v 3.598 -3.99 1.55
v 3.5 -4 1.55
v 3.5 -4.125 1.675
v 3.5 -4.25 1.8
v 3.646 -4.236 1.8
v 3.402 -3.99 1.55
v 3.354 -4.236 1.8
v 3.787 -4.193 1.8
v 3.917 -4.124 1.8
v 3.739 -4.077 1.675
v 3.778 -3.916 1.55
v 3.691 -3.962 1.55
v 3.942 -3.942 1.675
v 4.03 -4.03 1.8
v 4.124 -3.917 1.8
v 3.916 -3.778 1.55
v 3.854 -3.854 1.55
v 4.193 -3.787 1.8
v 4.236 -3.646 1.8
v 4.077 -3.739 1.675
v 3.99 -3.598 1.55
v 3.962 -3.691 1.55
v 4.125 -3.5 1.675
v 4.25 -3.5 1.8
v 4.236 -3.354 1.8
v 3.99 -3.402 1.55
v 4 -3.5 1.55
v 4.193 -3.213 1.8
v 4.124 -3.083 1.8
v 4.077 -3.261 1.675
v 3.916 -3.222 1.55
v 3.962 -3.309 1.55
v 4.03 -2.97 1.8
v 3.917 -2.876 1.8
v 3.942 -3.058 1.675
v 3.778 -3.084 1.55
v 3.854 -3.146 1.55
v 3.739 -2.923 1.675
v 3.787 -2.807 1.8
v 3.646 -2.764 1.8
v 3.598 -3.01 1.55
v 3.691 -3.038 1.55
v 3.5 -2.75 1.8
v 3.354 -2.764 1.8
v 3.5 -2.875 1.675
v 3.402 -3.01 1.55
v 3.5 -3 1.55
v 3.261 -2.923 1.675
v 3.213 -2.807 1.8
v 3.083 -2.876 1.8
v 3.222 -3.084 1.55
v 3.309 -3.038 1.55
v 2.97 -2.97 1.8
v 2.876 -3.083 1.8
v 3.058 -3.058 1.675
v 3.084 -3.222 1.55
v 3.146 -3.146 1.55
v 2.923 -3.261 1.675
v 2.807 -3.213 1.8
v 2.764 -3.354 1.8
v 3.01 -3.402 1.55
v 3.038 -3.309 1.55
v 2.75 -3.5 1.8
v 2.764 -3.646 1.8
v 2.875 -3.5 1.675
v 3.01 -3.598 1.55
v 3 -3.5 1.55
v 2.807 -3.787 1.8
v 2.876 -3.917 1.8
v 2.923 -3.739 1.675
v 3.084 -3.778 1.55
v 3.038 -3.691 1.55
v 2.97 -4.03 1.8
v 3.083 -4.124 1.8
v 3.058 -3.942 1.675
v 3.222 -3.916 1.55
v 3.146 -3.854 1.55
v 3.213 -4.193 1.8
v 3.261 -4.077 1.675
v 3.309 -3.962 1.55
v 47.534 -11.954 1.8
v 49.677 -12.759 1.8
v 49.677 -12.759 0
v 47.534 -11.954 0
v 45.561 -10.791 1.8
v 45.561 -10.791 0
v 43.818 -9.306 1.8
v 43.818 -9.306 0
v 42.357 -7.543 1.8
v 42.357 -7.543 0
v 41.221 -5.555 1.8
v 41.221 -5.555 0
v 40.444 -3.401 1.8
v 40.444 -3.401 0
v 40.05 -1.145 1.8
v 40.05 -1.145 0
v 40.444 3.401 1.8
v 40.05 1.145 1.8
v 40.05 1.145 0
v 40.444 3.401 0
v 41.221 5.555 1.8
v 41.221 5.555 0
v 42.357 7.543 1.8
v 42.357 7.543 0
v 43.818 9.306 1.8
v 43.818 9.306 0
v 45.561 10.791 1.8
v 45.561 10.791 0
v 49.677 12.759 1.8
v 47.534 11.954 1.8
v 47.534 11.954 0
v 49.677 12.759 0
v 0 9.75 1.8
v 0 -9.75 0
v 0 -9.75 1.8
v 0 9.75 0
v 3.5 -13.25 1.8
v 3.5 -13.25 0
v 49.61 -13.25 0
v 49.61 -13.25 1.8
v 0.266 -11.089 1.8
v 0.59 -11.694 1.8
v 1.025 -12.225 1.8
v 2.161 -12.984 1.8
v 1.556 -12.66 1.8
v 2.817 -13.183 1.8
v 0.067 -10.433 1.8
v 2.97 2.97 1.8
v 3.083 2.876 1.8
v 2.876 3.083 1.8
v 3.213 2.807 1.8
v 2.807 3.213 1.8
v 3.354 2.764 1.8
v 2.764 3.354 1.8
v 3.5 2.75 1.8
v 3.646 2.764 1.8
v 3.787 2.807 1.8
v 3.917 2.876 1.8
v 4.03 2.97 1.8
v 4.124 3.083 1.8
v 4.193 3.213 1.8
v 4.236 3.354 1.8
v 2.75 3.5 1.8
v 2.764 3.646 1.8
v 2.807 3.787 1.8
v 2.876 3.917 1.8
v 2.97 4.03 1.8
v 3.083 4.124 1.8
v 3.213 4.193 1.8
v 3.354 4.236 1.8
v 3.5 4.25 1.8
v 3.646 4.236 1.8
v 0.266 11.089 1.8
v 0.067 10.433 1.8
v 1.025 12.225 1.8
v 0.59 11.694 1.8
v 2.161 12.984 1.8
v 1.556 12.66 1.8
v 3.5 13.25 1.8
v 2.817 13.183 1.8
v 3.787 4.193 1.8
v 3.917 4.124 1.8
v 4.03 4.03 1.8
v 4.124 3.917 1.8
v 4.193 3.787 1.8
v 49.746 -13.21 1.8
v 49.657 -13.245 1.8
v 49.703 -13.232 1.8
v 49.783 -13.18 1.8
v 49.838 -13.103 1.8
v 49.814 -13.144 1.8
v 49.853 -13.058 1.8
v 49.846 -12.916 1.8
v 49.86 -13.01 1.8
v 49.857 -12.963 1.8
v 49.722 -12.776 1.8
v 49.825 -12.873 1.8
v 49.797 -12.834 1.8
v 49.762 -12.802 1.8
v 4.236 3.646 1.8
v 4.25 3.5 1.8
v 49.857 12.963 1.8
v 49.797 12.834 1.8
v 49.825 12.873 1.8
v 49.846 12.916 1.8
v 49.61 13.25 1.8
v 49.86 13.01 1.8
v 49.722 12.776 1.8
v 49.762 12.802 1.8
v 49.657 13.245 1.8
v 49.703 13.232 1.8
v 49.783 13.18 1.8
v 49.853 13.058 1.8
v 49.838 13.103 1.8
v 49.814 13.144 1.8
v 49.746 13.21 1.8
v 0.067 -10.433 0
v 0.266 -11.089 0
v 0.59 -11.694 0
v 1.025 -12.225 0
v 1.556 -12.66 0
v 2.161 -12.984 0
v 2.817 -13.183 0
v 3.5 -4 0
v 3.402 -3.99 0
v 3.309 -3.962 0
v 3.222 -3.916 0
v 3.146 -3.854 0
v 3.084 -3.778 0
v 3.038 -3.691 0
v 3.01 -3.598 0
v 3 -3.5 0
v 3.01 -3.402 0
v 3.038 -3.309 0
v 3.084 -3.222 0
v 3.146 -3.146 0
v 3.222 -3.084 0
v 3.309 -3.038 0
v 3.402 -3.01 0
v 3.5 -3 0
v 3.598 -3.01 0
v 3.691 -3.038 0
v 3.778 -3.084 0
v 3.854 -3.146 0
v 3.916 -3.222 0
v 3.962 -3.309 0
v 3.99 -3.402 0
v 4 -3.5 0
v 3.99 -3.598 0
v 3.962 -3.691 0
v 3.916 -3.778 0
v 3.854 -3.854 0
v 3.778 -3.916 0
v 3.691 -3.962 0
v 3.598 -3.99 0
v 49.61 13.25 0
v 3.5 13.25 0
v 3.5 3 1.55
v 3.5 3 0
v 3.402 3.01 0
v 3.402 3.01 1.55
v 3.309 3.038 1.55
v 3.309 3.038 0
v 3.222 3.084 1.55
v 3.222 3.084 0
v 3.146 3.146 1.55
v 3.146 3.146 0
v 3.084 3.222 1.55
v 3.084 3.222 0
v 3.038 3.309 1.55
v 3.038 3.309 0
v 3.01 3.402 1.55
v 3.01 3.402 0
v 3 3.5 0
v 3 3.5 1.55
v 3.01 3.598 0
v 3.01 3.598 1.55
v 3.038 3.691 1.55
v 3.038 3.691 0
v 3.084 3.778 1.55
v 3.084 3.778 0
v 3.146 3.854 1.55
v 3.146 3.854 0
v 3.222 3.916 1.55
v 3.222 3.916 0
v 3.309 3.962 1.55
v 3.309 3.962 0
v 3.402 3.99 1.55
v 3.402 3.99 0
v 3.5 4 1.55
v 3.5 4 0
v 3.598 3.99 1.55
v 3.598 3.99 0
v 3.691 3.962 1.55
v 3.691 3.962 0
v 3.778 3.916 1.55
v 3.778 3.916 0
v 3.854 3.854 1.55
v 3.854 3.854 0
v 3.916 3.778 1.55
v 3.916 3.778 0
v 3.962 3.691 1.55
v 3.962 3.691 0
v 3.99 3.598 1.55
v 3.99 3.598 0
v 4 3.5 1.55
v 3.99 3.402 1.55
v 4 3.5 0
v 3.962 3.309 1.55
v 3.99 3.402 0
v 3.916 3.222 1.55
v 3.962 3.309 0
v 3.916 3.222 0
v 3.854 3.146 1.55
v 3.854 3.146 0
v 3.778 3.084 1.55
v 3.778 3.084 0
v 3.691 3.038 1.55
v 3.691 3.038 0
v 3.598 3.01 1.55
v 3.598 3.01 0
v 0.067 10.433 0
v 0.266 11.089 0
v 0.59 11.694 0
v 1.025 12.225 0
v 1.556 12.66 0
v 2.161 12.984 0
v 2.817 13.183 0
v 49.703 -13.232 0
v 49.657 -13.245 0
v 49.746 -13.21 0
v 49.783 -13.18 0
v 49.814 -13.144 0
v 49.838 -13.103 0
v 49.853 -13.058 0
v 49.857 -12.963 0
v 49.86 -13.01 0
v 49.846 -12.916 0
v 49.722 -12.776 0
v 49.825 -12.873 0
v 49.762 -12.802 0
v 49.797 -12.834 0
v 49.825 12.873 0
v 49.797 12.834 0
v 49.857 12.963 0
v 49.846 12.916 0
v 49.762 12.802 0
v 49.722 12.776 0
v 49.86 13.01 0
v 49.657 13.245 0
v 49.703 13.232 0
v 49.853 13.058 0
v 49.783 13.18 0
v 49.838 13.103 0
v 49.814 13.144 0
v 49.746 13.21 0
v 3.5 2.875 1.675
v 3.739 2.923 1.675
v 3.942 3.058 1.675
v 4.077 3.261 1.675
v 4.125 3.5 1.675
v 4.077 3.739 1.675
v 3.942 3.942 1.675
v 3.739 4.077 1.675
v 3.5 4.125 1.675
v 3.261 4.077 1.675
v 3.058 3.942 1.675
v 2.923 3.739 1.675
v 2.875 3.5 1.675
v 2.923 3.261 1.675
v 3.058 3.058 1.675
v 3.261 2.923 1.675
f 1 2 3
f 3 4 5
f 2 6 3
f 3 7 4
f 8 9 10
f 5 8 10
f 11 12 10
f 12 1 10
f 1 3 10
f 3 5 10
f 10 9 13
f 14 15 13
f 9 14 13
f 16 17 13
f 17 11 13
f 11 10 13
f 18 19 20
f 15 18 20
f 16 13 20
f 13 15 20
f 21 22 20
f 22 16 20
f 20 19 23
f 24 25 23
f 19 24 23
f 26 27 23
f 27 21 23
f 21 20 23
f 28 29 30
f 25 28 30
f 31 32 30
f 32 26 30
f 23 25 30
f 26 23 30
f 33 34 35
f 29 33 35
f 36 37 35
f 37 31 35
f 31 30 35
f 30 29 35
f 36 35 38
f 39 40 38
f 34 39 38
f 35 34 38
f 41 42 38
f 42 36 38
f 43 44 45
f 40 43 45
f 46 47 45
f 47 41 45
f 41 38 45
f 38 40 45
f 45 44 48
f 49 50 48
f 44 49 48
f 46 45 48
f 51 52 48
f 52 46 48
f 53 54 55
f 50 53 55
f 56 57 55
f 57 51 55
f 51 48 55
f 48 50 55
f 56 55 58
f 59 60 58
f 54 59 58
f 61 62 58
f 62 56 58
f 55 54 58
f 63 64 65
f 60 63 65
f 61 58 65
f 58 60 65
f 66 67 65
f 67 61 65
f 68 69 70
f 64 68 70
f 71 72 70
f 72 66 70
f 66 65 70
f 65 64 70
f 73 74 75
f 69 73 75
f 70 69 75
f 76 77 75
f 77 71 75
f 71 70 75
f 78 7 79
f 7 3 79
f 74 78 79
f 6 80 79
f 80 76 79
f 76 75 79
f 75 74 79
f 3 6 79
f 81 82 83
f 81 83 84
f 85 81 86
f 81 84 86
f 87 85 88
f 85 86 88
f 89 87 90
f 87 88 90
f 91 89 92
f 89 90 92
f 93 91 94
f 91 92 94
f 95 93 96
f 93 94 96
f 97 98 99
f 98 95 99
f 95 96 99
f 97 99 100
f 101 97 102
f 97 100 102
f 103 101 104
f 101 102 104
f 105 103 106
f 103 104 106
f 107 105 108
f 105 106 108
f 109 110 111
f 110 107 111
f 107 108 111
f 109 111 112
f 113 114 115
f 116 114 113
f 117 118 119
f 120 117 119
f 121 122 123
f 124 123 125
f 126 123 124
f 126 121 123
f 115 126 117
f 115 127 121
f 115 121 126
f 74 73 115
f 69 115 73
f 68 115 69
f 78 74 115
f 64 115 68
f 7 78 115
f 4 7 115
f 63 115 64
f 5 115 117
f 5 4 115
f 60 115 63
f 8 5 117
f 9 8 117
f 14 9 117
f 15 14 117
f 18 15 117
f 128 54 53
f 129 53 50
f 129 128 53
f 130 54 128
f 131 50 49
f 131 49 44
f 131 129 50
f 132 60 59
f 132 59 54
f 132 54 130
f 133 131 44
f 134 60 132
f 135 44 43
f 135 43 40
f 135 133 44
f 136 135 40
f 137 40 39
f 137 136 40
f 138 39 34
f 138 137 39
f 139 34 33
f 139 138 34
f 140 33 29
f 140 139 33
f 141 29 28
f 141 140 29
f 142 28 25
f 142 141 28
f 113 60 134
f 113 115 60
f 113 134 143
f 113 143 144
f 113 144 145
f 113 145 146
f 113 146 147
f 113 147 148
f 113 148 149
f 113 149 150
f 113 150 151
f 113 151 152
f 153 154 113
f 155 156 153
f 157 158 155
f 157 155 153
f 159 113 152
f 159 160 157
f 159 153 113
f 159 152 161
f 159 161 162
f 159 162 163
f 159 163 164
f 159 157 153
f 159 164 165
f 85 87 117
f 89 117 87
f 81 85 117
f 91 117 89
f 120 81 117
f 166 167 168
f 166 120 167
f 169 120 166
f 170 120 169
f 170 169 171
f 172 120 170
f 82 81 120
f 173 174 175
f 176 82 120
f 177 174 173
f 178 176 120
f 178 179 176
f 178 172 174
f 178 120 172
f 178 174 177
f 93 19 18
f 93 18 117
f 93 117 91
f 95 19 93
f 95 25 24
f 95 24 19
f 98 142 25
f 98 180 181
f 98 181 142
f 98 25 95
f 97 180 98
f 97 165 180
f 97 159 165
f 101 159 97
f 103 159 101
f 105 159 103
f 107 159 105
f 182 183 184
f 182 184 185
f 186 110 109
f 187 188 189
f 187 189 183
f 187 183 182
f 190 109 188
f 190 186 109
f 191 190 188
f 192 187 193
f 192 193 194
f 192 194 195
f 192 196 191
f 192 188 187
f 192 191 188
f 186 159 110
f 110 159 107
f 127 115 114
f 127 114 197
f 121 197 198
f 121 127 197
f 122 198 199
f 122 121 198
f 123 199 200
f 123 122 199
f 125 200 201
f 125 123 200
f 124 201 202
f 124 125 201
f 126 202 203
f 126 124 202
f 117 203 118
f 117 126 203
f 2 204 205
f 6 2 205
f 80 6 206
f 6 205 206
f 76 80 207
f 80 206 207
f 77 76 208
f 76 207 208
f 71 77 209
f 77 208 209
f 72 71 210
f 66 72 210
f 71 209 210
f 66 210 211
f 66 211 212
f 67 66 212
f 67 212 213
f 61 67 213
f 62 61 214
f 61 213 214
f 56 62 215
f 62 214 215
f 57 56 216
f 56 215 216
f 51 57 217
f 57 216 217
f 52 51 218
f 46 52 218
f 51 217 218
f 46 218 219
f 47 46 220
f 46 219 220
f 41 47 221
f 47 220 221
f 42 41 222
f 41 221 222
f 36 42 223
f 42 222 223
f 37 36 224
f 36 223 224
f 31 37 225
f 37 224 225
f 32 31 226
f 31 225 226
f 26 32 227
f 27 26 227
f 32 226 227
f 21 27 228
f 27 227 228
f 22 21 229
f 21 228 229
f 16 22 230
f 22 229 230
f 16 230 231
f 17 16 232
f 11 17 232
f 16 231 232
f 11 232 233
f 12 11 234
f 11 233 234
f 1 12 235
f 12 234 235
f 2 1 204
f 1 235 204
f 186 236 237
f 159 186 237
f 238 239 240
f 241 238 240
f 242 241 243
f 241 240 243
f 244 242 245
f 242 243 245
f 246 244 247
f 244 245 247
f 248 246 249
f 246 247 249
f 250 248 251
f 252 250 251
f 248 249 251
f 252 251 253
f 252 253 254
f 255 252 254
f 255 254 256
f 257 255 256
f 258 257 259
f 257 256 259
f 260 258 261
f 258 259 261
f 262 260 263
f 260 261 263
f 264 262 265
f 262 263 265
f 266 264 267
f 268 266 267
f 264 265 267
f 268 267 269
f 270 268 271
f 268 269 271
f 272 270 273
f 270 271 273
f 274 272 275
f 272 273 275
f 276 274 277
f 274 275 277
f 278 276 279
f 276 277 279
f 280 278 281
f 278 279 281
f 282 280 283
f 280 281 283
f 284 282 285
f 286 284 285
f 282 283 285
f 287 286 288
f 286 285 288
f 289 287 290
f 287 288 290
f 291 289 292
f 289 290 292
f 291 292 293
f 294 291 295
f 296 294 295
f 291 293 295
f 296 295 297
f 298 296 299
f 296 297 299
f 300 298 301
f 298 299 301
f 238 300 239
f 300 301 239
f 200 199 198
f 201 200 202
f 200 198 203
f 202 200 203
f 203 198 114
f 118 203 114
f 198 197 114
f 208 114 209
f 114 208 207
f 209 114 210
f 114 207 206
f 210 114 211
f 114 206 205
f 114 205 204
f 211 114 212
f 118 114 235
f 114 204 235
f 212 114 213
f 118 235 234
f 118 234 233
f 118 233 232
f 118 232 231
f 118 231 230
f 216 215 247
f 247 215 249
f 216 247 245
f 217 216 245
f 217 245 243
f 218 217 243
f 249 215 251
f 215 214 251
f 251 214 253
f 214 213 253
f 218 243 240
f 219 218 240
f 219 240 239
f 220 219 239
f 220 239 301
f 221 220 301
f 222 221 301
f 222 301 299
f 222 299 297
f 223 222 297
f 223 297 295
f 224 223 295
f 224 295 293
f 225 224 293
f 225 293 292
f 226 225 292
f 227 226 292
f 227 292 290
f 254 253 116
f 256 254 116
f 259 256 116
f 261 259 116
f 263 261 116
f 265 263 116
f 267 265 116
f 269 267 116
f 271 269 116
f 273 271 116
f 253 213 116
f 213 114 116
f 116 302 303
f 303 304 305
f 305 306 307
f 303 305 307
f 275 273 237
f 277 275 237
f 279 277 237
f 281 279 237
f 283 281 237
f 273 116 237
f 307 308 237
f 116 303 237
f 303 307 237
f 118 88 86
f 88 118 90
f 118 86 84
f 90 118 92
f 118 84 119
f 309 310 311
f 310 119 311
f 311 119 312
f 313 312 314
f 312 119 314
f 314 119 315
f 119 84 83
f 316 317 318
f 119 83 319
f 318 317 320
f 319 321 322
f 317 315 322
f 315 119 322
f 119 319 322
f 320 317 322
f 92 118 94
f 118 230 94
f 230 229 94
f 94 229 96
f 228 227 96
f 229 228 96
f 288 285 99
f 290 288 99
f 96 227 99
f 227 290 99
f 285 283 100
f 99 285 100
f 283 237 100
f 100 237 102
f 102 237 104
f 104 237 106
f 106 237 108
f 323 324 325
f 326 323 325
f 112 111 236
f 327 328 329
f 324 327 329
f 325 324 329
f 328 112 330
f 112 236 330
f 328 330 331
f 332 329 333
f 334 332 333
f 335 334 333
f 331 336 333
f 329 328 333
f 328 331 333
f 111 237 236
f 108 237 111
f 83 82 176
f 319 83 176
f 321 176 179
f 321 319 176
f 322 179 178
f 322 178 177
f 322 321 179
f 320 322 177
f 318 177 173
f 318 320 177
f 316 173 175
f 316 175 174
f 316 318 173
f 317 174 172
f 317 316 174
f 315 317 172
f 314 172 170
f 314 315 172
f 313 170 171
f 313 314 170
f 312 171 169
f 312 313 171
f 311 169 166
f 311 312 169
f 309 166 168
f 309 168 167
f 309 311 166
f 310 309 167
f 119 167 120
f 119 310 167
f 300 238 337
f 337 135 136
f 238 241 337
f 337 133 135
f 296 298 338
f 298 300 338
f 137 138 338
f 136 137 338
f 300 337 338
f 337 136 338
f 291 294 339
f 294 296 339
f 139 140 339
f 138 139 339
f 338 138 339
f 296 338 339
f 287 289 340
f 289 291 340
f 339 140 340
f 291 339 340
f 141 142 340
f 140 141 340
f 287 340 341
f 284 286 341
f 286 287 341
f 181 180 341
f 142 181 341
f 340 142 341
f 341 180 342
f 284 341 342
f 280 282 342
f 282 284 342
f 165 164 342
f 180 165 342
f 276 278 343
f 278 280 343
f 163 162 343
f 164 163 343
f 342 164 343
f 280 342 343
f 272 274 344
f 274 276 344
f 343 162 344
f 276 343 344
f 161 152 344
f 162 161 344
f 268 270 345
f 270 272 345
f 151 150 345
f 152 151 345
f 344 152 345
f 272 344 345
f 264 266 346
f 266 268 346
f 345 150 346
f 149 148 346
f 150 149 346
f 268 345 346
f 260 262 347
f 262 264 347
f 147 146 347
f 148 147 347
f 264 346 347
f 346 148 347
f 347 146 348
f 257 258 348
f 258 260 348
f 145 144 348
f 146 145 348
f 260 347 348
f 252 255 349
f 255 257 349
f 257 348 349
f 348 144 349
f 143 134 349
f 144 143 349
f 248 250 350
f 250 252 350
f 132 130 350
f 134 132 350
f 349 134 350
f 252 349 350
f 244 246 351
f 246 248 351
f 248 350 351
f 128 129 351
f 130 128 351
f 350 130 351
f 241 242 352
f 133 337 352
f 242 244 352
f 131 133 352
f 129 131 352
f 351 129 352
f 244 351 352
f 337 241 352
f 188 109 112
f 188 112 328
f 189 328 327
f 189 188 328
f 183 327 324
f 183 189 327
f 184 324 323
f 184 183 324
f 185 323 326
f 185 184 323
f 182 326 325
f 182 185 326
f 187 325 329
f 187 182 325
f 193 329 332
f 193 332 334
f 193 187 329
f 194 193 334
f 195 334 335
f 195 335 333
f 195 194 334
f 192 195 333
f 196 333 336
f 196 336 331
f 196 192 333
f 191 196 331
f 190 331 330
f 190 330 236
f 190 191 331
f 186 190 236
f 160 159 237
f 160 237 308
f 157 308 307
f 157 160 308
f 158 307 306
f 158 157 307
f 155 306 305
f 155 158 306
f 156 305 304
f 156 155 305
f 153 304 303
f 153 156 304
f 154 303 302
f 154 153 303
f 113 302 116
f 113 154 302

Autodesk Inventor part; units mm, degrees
ref_plane "YZ Plane" through (0, 0, 0) normal (1, 0, 0) x (0, 1, 0)
ref_plane "XZ Plane" through (0, 0, 0) normal (0, 1, 0) x (-1, 0, 0)
ref_plane "XY Plane" through (0, 0, 0) normal (0, 0, 1) x (1, 0, 0)
sketch "Эскиз1" plane through (0, 0, 0) normal (0, 0, 1) x (1, 0, 0)
  line L0 (53.25, 13.25) -> (0, 13.25)
  line L1 (0, -13.25) -> (53.25, -13.25)
  arc A0 (53.25, 13.25) -> (53.25, -13.25) centre (53.25, 0) ccw
  line L2 (0, -13.25) -> (0, 13.25)
  line L3 (0, 0) -> (40, 0) construction
  line L4 (0, 0) -> (0, 13.25) construction
  line L5 (0, 13.25) -> (0, 11.25)
  point P0 (20, 0)
  dimension "d0" = 13.25
  dimension "d47" = 40
extrude "Выдавливание3" add sketch "Эскиз1" along normal blind 1.8
fillet "Сопряжение3" radius 0.25 2 edges at (53.25, 13.25, 0.9) (53.25, -13.25, 0.9)
fillet "Сопряжение4" radius 3.5 2 edges at (0, -13.25, 0.9) (0, 13.25, 0.9)
sketch "Эскиз6" plane through (0, 0, 1.8) normal (0, 0, 1) x (1, 0, 0)
  arc A0 (49.6774, 12.7593) -> (49.6774, -12.7593) centre (53.25, 0) ccw construction
  line L0 (40, 0) -> (0, 0) construction
  line L1 (0, -13.25) -> (0, 13.25) construction
  circle A1 centre (3.5, 3.5) radius 0.5
  line L2 (3.5, 3.5) -> (0, 3.5) construction
  line L3 (3.5, 3.5) -> (3.5, 0) construction
  circle A2 centre (3.5, -3.5) radius 0.5
  point P0 (49.6099, -13.25)
  dimension "d58" = 1
  dimension "d59" = 3.5
hole "Отверстие1" at (3.5, -3.5, 1.8) at (3.5, 3.5, 1.8) direction (0, 0, -1) diameter 1 end through all countersink diameter 1.5 countersink angle 90
properties part number "Поршень"
